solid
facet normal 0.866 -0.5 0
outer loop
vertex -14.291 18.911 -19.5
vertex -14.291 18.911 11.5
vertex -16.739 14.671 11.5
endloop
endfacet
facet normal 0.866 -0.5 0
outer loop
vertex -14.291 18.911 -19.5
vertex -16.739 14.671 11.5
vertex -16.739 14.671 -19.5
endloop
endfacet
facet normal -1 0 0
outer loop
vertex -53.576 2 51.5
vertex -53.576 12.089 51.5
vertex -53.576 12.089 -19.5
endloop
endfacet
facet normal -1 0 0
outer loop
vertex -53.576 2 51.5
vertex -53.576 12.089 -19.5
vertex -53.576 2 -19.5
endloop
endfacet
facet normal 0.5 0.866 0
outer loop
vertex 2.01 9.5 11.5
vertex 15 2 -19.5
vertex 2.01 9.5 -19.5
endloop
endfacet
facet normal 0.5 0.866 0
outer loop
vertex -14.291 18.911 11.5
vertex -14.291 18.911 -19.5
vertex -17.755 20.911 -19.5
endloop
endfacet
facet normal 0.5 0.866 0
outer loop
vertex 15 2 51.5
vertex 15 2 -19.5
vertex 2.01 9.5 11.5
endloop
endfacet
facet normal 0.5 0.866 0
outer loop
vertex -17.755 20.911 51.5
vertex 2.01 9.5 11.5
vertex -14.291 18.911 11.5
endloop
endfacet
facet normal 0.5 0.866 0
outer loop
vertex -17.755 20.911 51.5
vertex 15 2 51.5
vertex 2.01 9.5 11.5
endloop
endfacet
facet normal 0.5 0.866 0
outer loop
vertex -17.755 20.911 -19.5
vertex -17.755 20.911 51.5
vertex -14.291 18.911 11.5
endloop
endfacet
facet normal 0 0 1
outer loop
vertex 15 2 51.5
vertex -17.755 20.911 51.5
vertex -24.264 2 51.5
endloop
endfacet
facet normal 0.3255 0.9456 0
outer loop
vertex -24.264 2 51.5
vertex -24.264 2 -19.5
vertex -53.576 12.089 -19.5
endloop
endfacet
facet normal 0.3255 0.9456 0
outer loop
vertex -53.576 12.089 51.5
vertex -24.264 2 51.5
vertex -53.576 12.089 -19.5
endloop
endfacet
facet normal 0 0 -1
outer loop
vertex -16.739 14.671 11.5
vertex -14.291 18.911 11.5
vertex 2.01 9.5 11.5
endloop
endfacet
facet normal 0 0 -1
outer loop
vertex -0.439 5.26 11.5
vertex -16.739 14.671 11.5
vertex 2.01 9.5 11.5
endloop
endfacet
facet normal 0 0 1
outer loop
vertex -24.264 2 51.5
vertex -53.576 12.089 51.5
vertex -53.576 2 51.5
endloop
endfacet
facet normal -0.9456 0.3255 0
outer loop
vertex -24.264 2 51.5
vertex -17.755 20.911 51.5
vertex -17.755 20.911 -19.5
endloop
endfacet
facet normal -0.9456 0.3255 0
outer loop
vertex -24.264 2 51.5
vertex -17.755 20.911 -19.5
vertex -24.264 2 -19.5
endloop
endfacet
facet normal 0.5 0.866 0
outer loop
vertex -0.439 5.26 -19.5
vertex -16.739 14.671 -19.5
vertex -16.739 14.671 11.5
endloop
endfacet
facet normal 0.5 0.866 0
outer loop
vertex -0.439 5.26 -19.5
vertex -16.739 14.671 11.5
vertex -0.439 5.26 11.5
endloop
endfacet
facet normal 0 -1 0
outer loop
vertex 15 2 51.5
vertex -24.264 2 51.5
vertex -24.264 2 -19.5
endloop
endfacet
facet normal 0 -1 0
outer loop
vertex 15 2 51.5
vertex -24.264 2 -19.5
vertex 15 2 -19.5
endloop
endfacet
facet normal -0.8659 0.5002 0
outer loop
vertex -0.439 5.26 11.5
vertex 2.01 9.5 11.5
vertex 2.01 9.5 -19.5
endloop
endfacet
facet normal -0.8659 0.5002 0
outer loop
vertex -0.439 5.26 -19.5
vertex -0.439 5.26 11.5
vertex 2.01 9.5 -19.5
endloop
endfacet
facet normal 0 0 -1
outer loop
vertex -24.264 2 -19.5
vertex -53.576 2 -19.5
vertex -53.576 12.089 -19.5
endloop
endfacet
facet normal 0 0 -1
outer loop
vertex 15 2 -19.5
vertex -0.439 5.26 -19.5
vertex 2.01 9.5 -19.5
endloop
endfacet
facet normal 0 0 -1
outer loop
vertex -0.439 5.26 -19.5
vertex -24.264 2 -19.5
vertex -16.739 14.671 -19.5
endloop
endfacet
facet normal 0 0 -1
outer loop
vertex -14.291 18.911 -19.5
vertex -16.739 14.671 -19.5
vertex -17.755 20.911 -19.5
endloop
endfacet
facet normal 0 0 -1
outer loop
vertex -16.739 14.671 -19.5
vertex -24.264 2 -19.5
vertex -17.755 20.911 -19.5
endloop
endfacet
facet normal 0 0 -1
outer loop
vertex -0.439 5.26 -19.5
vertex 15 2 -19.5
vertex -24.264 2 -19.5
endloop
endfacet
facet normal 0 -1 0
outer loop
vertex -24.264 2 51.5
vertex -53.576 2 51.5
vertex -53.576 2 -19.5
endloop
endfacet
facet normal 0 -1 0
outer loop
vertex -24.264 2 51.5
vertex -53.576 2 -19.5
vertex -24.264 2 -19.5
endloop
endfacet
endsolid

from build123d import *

# Parameters (mm, degrees)
SKETCH1_W               = 30
SKETCH1_H               = 103
BOSS_EXTRUDE1_DEPTH     = 2
BOSS_EXTRUDE2_DEPTH     = 103
SKETCH6_W               = 18.822447129
SKETCH6_H               = 70
CUT_EXTRUDE3_DEPTH      = 4.8963936
SKETCH7_W               = 32
SKETCH7_H               = 20.911223564
CUT_EXTRUDE4_DEPTH      = 73
SKETCH8_W               = 88.3630593
SKETCH8_H               = 30.379136557
CUT_EXTRUDE6_DEPTH      = 92.371324673
CUT_EXTRUDE6_DEPTH_BACK = 92.371324673


with BuildPart() as part:
    # Sketch1 → Boss-Extrude1 (new body)
    with BuildSketch(Plane(origin=(0, 0, 0), x_dir=(1, 0, 0), z_dir=(0, 1, 0))):
        Rectangle(SKETCH1_W, SKETCH1_H)
    extrude(amount=BOSS_EXTRUDE1_DEPTH)

    # Sketch2 → Boss-Extrude2 (add)
    with BuildSketch(Plane.XY.offset(51.5)):
        Polygon((0, 2), (15, 2), (-17.755200047, 20.911223564), (-24.26408807, 2), (-53.576484595, 12.088776436), (-53.576484595, 0), (-15, 0), (-15, 2), align=None)
    extrude(amount=-BOSS_EXTRUDE2_DEPTH)

    # Sketch6 → Cut-Extrude3 (cut)
    with BuildSketch(Plane(origin=(4.616025404, 7.995190528, 0), x_dir=(0.8660254037844382, -0.5000000000000009, 0), z_dir=(0.5000000000000009, 0.8660254037844382, 0))):
        with Locations((-12.420842507, 23.5)):
            Rectangle(SKETCH6_W, SKETCH6_H)
    extrude(amount=-CUT_EXTRUDE3_DEPTH, mode=Mode.SUBTRACT)

    # Sketch7 → Cut-Extrude4 (cut)
    with BuildSketch(Plane.ZY.offset(53.576484595)):
        with Locations((-35.5, 10.455611782)):
            Rectangle(SKETCH7_W, SKETCH7_H)
    extrude(amount=-CUT_EXTRUDE4_DEPTH, mode=Mode.SUBTRACT)

    # Sketch8 → Cut-Extrude6 (cut, two sides)
    with BuildSketch(Plane.XY.offset(51.5)) as cut_extrude6_sk:
        with Locations((-29.18152965, -13.189568279)):
            Rectangle(SKETCH8_W, SKETCH8_H)
    extrude(amount=CUT_EXTRUDE6_DEPTH, mode=Mode.SUBTRACT)
    extrude(cut_extrude6_sk.sketch, amount=-CUT_EXTRUDE6_DEPTH_BACK, mode=Mode.SUBTRACT)


with BuildPart() as cut_extrude6_piece_1:
    # of the separate pieces the step leaves, piece 1, a body of its own (cut_extrude6_pieces)
    add(part.part.solids().sort_by_distance((15, 2, 51.5))[0])


with BuildPart() as cut_extrude6_piece_2:
    # of the separate pieces the step leaves, piece 2, a body of its own (cut_extrude6_pieces)
    add(part.part.solids().sort_by_distance((-53.576484595, 2, 51.5))[0])


solid = Compound([cut_extrude6_piece_1.part, cut_extrude6_piece_2.part])
